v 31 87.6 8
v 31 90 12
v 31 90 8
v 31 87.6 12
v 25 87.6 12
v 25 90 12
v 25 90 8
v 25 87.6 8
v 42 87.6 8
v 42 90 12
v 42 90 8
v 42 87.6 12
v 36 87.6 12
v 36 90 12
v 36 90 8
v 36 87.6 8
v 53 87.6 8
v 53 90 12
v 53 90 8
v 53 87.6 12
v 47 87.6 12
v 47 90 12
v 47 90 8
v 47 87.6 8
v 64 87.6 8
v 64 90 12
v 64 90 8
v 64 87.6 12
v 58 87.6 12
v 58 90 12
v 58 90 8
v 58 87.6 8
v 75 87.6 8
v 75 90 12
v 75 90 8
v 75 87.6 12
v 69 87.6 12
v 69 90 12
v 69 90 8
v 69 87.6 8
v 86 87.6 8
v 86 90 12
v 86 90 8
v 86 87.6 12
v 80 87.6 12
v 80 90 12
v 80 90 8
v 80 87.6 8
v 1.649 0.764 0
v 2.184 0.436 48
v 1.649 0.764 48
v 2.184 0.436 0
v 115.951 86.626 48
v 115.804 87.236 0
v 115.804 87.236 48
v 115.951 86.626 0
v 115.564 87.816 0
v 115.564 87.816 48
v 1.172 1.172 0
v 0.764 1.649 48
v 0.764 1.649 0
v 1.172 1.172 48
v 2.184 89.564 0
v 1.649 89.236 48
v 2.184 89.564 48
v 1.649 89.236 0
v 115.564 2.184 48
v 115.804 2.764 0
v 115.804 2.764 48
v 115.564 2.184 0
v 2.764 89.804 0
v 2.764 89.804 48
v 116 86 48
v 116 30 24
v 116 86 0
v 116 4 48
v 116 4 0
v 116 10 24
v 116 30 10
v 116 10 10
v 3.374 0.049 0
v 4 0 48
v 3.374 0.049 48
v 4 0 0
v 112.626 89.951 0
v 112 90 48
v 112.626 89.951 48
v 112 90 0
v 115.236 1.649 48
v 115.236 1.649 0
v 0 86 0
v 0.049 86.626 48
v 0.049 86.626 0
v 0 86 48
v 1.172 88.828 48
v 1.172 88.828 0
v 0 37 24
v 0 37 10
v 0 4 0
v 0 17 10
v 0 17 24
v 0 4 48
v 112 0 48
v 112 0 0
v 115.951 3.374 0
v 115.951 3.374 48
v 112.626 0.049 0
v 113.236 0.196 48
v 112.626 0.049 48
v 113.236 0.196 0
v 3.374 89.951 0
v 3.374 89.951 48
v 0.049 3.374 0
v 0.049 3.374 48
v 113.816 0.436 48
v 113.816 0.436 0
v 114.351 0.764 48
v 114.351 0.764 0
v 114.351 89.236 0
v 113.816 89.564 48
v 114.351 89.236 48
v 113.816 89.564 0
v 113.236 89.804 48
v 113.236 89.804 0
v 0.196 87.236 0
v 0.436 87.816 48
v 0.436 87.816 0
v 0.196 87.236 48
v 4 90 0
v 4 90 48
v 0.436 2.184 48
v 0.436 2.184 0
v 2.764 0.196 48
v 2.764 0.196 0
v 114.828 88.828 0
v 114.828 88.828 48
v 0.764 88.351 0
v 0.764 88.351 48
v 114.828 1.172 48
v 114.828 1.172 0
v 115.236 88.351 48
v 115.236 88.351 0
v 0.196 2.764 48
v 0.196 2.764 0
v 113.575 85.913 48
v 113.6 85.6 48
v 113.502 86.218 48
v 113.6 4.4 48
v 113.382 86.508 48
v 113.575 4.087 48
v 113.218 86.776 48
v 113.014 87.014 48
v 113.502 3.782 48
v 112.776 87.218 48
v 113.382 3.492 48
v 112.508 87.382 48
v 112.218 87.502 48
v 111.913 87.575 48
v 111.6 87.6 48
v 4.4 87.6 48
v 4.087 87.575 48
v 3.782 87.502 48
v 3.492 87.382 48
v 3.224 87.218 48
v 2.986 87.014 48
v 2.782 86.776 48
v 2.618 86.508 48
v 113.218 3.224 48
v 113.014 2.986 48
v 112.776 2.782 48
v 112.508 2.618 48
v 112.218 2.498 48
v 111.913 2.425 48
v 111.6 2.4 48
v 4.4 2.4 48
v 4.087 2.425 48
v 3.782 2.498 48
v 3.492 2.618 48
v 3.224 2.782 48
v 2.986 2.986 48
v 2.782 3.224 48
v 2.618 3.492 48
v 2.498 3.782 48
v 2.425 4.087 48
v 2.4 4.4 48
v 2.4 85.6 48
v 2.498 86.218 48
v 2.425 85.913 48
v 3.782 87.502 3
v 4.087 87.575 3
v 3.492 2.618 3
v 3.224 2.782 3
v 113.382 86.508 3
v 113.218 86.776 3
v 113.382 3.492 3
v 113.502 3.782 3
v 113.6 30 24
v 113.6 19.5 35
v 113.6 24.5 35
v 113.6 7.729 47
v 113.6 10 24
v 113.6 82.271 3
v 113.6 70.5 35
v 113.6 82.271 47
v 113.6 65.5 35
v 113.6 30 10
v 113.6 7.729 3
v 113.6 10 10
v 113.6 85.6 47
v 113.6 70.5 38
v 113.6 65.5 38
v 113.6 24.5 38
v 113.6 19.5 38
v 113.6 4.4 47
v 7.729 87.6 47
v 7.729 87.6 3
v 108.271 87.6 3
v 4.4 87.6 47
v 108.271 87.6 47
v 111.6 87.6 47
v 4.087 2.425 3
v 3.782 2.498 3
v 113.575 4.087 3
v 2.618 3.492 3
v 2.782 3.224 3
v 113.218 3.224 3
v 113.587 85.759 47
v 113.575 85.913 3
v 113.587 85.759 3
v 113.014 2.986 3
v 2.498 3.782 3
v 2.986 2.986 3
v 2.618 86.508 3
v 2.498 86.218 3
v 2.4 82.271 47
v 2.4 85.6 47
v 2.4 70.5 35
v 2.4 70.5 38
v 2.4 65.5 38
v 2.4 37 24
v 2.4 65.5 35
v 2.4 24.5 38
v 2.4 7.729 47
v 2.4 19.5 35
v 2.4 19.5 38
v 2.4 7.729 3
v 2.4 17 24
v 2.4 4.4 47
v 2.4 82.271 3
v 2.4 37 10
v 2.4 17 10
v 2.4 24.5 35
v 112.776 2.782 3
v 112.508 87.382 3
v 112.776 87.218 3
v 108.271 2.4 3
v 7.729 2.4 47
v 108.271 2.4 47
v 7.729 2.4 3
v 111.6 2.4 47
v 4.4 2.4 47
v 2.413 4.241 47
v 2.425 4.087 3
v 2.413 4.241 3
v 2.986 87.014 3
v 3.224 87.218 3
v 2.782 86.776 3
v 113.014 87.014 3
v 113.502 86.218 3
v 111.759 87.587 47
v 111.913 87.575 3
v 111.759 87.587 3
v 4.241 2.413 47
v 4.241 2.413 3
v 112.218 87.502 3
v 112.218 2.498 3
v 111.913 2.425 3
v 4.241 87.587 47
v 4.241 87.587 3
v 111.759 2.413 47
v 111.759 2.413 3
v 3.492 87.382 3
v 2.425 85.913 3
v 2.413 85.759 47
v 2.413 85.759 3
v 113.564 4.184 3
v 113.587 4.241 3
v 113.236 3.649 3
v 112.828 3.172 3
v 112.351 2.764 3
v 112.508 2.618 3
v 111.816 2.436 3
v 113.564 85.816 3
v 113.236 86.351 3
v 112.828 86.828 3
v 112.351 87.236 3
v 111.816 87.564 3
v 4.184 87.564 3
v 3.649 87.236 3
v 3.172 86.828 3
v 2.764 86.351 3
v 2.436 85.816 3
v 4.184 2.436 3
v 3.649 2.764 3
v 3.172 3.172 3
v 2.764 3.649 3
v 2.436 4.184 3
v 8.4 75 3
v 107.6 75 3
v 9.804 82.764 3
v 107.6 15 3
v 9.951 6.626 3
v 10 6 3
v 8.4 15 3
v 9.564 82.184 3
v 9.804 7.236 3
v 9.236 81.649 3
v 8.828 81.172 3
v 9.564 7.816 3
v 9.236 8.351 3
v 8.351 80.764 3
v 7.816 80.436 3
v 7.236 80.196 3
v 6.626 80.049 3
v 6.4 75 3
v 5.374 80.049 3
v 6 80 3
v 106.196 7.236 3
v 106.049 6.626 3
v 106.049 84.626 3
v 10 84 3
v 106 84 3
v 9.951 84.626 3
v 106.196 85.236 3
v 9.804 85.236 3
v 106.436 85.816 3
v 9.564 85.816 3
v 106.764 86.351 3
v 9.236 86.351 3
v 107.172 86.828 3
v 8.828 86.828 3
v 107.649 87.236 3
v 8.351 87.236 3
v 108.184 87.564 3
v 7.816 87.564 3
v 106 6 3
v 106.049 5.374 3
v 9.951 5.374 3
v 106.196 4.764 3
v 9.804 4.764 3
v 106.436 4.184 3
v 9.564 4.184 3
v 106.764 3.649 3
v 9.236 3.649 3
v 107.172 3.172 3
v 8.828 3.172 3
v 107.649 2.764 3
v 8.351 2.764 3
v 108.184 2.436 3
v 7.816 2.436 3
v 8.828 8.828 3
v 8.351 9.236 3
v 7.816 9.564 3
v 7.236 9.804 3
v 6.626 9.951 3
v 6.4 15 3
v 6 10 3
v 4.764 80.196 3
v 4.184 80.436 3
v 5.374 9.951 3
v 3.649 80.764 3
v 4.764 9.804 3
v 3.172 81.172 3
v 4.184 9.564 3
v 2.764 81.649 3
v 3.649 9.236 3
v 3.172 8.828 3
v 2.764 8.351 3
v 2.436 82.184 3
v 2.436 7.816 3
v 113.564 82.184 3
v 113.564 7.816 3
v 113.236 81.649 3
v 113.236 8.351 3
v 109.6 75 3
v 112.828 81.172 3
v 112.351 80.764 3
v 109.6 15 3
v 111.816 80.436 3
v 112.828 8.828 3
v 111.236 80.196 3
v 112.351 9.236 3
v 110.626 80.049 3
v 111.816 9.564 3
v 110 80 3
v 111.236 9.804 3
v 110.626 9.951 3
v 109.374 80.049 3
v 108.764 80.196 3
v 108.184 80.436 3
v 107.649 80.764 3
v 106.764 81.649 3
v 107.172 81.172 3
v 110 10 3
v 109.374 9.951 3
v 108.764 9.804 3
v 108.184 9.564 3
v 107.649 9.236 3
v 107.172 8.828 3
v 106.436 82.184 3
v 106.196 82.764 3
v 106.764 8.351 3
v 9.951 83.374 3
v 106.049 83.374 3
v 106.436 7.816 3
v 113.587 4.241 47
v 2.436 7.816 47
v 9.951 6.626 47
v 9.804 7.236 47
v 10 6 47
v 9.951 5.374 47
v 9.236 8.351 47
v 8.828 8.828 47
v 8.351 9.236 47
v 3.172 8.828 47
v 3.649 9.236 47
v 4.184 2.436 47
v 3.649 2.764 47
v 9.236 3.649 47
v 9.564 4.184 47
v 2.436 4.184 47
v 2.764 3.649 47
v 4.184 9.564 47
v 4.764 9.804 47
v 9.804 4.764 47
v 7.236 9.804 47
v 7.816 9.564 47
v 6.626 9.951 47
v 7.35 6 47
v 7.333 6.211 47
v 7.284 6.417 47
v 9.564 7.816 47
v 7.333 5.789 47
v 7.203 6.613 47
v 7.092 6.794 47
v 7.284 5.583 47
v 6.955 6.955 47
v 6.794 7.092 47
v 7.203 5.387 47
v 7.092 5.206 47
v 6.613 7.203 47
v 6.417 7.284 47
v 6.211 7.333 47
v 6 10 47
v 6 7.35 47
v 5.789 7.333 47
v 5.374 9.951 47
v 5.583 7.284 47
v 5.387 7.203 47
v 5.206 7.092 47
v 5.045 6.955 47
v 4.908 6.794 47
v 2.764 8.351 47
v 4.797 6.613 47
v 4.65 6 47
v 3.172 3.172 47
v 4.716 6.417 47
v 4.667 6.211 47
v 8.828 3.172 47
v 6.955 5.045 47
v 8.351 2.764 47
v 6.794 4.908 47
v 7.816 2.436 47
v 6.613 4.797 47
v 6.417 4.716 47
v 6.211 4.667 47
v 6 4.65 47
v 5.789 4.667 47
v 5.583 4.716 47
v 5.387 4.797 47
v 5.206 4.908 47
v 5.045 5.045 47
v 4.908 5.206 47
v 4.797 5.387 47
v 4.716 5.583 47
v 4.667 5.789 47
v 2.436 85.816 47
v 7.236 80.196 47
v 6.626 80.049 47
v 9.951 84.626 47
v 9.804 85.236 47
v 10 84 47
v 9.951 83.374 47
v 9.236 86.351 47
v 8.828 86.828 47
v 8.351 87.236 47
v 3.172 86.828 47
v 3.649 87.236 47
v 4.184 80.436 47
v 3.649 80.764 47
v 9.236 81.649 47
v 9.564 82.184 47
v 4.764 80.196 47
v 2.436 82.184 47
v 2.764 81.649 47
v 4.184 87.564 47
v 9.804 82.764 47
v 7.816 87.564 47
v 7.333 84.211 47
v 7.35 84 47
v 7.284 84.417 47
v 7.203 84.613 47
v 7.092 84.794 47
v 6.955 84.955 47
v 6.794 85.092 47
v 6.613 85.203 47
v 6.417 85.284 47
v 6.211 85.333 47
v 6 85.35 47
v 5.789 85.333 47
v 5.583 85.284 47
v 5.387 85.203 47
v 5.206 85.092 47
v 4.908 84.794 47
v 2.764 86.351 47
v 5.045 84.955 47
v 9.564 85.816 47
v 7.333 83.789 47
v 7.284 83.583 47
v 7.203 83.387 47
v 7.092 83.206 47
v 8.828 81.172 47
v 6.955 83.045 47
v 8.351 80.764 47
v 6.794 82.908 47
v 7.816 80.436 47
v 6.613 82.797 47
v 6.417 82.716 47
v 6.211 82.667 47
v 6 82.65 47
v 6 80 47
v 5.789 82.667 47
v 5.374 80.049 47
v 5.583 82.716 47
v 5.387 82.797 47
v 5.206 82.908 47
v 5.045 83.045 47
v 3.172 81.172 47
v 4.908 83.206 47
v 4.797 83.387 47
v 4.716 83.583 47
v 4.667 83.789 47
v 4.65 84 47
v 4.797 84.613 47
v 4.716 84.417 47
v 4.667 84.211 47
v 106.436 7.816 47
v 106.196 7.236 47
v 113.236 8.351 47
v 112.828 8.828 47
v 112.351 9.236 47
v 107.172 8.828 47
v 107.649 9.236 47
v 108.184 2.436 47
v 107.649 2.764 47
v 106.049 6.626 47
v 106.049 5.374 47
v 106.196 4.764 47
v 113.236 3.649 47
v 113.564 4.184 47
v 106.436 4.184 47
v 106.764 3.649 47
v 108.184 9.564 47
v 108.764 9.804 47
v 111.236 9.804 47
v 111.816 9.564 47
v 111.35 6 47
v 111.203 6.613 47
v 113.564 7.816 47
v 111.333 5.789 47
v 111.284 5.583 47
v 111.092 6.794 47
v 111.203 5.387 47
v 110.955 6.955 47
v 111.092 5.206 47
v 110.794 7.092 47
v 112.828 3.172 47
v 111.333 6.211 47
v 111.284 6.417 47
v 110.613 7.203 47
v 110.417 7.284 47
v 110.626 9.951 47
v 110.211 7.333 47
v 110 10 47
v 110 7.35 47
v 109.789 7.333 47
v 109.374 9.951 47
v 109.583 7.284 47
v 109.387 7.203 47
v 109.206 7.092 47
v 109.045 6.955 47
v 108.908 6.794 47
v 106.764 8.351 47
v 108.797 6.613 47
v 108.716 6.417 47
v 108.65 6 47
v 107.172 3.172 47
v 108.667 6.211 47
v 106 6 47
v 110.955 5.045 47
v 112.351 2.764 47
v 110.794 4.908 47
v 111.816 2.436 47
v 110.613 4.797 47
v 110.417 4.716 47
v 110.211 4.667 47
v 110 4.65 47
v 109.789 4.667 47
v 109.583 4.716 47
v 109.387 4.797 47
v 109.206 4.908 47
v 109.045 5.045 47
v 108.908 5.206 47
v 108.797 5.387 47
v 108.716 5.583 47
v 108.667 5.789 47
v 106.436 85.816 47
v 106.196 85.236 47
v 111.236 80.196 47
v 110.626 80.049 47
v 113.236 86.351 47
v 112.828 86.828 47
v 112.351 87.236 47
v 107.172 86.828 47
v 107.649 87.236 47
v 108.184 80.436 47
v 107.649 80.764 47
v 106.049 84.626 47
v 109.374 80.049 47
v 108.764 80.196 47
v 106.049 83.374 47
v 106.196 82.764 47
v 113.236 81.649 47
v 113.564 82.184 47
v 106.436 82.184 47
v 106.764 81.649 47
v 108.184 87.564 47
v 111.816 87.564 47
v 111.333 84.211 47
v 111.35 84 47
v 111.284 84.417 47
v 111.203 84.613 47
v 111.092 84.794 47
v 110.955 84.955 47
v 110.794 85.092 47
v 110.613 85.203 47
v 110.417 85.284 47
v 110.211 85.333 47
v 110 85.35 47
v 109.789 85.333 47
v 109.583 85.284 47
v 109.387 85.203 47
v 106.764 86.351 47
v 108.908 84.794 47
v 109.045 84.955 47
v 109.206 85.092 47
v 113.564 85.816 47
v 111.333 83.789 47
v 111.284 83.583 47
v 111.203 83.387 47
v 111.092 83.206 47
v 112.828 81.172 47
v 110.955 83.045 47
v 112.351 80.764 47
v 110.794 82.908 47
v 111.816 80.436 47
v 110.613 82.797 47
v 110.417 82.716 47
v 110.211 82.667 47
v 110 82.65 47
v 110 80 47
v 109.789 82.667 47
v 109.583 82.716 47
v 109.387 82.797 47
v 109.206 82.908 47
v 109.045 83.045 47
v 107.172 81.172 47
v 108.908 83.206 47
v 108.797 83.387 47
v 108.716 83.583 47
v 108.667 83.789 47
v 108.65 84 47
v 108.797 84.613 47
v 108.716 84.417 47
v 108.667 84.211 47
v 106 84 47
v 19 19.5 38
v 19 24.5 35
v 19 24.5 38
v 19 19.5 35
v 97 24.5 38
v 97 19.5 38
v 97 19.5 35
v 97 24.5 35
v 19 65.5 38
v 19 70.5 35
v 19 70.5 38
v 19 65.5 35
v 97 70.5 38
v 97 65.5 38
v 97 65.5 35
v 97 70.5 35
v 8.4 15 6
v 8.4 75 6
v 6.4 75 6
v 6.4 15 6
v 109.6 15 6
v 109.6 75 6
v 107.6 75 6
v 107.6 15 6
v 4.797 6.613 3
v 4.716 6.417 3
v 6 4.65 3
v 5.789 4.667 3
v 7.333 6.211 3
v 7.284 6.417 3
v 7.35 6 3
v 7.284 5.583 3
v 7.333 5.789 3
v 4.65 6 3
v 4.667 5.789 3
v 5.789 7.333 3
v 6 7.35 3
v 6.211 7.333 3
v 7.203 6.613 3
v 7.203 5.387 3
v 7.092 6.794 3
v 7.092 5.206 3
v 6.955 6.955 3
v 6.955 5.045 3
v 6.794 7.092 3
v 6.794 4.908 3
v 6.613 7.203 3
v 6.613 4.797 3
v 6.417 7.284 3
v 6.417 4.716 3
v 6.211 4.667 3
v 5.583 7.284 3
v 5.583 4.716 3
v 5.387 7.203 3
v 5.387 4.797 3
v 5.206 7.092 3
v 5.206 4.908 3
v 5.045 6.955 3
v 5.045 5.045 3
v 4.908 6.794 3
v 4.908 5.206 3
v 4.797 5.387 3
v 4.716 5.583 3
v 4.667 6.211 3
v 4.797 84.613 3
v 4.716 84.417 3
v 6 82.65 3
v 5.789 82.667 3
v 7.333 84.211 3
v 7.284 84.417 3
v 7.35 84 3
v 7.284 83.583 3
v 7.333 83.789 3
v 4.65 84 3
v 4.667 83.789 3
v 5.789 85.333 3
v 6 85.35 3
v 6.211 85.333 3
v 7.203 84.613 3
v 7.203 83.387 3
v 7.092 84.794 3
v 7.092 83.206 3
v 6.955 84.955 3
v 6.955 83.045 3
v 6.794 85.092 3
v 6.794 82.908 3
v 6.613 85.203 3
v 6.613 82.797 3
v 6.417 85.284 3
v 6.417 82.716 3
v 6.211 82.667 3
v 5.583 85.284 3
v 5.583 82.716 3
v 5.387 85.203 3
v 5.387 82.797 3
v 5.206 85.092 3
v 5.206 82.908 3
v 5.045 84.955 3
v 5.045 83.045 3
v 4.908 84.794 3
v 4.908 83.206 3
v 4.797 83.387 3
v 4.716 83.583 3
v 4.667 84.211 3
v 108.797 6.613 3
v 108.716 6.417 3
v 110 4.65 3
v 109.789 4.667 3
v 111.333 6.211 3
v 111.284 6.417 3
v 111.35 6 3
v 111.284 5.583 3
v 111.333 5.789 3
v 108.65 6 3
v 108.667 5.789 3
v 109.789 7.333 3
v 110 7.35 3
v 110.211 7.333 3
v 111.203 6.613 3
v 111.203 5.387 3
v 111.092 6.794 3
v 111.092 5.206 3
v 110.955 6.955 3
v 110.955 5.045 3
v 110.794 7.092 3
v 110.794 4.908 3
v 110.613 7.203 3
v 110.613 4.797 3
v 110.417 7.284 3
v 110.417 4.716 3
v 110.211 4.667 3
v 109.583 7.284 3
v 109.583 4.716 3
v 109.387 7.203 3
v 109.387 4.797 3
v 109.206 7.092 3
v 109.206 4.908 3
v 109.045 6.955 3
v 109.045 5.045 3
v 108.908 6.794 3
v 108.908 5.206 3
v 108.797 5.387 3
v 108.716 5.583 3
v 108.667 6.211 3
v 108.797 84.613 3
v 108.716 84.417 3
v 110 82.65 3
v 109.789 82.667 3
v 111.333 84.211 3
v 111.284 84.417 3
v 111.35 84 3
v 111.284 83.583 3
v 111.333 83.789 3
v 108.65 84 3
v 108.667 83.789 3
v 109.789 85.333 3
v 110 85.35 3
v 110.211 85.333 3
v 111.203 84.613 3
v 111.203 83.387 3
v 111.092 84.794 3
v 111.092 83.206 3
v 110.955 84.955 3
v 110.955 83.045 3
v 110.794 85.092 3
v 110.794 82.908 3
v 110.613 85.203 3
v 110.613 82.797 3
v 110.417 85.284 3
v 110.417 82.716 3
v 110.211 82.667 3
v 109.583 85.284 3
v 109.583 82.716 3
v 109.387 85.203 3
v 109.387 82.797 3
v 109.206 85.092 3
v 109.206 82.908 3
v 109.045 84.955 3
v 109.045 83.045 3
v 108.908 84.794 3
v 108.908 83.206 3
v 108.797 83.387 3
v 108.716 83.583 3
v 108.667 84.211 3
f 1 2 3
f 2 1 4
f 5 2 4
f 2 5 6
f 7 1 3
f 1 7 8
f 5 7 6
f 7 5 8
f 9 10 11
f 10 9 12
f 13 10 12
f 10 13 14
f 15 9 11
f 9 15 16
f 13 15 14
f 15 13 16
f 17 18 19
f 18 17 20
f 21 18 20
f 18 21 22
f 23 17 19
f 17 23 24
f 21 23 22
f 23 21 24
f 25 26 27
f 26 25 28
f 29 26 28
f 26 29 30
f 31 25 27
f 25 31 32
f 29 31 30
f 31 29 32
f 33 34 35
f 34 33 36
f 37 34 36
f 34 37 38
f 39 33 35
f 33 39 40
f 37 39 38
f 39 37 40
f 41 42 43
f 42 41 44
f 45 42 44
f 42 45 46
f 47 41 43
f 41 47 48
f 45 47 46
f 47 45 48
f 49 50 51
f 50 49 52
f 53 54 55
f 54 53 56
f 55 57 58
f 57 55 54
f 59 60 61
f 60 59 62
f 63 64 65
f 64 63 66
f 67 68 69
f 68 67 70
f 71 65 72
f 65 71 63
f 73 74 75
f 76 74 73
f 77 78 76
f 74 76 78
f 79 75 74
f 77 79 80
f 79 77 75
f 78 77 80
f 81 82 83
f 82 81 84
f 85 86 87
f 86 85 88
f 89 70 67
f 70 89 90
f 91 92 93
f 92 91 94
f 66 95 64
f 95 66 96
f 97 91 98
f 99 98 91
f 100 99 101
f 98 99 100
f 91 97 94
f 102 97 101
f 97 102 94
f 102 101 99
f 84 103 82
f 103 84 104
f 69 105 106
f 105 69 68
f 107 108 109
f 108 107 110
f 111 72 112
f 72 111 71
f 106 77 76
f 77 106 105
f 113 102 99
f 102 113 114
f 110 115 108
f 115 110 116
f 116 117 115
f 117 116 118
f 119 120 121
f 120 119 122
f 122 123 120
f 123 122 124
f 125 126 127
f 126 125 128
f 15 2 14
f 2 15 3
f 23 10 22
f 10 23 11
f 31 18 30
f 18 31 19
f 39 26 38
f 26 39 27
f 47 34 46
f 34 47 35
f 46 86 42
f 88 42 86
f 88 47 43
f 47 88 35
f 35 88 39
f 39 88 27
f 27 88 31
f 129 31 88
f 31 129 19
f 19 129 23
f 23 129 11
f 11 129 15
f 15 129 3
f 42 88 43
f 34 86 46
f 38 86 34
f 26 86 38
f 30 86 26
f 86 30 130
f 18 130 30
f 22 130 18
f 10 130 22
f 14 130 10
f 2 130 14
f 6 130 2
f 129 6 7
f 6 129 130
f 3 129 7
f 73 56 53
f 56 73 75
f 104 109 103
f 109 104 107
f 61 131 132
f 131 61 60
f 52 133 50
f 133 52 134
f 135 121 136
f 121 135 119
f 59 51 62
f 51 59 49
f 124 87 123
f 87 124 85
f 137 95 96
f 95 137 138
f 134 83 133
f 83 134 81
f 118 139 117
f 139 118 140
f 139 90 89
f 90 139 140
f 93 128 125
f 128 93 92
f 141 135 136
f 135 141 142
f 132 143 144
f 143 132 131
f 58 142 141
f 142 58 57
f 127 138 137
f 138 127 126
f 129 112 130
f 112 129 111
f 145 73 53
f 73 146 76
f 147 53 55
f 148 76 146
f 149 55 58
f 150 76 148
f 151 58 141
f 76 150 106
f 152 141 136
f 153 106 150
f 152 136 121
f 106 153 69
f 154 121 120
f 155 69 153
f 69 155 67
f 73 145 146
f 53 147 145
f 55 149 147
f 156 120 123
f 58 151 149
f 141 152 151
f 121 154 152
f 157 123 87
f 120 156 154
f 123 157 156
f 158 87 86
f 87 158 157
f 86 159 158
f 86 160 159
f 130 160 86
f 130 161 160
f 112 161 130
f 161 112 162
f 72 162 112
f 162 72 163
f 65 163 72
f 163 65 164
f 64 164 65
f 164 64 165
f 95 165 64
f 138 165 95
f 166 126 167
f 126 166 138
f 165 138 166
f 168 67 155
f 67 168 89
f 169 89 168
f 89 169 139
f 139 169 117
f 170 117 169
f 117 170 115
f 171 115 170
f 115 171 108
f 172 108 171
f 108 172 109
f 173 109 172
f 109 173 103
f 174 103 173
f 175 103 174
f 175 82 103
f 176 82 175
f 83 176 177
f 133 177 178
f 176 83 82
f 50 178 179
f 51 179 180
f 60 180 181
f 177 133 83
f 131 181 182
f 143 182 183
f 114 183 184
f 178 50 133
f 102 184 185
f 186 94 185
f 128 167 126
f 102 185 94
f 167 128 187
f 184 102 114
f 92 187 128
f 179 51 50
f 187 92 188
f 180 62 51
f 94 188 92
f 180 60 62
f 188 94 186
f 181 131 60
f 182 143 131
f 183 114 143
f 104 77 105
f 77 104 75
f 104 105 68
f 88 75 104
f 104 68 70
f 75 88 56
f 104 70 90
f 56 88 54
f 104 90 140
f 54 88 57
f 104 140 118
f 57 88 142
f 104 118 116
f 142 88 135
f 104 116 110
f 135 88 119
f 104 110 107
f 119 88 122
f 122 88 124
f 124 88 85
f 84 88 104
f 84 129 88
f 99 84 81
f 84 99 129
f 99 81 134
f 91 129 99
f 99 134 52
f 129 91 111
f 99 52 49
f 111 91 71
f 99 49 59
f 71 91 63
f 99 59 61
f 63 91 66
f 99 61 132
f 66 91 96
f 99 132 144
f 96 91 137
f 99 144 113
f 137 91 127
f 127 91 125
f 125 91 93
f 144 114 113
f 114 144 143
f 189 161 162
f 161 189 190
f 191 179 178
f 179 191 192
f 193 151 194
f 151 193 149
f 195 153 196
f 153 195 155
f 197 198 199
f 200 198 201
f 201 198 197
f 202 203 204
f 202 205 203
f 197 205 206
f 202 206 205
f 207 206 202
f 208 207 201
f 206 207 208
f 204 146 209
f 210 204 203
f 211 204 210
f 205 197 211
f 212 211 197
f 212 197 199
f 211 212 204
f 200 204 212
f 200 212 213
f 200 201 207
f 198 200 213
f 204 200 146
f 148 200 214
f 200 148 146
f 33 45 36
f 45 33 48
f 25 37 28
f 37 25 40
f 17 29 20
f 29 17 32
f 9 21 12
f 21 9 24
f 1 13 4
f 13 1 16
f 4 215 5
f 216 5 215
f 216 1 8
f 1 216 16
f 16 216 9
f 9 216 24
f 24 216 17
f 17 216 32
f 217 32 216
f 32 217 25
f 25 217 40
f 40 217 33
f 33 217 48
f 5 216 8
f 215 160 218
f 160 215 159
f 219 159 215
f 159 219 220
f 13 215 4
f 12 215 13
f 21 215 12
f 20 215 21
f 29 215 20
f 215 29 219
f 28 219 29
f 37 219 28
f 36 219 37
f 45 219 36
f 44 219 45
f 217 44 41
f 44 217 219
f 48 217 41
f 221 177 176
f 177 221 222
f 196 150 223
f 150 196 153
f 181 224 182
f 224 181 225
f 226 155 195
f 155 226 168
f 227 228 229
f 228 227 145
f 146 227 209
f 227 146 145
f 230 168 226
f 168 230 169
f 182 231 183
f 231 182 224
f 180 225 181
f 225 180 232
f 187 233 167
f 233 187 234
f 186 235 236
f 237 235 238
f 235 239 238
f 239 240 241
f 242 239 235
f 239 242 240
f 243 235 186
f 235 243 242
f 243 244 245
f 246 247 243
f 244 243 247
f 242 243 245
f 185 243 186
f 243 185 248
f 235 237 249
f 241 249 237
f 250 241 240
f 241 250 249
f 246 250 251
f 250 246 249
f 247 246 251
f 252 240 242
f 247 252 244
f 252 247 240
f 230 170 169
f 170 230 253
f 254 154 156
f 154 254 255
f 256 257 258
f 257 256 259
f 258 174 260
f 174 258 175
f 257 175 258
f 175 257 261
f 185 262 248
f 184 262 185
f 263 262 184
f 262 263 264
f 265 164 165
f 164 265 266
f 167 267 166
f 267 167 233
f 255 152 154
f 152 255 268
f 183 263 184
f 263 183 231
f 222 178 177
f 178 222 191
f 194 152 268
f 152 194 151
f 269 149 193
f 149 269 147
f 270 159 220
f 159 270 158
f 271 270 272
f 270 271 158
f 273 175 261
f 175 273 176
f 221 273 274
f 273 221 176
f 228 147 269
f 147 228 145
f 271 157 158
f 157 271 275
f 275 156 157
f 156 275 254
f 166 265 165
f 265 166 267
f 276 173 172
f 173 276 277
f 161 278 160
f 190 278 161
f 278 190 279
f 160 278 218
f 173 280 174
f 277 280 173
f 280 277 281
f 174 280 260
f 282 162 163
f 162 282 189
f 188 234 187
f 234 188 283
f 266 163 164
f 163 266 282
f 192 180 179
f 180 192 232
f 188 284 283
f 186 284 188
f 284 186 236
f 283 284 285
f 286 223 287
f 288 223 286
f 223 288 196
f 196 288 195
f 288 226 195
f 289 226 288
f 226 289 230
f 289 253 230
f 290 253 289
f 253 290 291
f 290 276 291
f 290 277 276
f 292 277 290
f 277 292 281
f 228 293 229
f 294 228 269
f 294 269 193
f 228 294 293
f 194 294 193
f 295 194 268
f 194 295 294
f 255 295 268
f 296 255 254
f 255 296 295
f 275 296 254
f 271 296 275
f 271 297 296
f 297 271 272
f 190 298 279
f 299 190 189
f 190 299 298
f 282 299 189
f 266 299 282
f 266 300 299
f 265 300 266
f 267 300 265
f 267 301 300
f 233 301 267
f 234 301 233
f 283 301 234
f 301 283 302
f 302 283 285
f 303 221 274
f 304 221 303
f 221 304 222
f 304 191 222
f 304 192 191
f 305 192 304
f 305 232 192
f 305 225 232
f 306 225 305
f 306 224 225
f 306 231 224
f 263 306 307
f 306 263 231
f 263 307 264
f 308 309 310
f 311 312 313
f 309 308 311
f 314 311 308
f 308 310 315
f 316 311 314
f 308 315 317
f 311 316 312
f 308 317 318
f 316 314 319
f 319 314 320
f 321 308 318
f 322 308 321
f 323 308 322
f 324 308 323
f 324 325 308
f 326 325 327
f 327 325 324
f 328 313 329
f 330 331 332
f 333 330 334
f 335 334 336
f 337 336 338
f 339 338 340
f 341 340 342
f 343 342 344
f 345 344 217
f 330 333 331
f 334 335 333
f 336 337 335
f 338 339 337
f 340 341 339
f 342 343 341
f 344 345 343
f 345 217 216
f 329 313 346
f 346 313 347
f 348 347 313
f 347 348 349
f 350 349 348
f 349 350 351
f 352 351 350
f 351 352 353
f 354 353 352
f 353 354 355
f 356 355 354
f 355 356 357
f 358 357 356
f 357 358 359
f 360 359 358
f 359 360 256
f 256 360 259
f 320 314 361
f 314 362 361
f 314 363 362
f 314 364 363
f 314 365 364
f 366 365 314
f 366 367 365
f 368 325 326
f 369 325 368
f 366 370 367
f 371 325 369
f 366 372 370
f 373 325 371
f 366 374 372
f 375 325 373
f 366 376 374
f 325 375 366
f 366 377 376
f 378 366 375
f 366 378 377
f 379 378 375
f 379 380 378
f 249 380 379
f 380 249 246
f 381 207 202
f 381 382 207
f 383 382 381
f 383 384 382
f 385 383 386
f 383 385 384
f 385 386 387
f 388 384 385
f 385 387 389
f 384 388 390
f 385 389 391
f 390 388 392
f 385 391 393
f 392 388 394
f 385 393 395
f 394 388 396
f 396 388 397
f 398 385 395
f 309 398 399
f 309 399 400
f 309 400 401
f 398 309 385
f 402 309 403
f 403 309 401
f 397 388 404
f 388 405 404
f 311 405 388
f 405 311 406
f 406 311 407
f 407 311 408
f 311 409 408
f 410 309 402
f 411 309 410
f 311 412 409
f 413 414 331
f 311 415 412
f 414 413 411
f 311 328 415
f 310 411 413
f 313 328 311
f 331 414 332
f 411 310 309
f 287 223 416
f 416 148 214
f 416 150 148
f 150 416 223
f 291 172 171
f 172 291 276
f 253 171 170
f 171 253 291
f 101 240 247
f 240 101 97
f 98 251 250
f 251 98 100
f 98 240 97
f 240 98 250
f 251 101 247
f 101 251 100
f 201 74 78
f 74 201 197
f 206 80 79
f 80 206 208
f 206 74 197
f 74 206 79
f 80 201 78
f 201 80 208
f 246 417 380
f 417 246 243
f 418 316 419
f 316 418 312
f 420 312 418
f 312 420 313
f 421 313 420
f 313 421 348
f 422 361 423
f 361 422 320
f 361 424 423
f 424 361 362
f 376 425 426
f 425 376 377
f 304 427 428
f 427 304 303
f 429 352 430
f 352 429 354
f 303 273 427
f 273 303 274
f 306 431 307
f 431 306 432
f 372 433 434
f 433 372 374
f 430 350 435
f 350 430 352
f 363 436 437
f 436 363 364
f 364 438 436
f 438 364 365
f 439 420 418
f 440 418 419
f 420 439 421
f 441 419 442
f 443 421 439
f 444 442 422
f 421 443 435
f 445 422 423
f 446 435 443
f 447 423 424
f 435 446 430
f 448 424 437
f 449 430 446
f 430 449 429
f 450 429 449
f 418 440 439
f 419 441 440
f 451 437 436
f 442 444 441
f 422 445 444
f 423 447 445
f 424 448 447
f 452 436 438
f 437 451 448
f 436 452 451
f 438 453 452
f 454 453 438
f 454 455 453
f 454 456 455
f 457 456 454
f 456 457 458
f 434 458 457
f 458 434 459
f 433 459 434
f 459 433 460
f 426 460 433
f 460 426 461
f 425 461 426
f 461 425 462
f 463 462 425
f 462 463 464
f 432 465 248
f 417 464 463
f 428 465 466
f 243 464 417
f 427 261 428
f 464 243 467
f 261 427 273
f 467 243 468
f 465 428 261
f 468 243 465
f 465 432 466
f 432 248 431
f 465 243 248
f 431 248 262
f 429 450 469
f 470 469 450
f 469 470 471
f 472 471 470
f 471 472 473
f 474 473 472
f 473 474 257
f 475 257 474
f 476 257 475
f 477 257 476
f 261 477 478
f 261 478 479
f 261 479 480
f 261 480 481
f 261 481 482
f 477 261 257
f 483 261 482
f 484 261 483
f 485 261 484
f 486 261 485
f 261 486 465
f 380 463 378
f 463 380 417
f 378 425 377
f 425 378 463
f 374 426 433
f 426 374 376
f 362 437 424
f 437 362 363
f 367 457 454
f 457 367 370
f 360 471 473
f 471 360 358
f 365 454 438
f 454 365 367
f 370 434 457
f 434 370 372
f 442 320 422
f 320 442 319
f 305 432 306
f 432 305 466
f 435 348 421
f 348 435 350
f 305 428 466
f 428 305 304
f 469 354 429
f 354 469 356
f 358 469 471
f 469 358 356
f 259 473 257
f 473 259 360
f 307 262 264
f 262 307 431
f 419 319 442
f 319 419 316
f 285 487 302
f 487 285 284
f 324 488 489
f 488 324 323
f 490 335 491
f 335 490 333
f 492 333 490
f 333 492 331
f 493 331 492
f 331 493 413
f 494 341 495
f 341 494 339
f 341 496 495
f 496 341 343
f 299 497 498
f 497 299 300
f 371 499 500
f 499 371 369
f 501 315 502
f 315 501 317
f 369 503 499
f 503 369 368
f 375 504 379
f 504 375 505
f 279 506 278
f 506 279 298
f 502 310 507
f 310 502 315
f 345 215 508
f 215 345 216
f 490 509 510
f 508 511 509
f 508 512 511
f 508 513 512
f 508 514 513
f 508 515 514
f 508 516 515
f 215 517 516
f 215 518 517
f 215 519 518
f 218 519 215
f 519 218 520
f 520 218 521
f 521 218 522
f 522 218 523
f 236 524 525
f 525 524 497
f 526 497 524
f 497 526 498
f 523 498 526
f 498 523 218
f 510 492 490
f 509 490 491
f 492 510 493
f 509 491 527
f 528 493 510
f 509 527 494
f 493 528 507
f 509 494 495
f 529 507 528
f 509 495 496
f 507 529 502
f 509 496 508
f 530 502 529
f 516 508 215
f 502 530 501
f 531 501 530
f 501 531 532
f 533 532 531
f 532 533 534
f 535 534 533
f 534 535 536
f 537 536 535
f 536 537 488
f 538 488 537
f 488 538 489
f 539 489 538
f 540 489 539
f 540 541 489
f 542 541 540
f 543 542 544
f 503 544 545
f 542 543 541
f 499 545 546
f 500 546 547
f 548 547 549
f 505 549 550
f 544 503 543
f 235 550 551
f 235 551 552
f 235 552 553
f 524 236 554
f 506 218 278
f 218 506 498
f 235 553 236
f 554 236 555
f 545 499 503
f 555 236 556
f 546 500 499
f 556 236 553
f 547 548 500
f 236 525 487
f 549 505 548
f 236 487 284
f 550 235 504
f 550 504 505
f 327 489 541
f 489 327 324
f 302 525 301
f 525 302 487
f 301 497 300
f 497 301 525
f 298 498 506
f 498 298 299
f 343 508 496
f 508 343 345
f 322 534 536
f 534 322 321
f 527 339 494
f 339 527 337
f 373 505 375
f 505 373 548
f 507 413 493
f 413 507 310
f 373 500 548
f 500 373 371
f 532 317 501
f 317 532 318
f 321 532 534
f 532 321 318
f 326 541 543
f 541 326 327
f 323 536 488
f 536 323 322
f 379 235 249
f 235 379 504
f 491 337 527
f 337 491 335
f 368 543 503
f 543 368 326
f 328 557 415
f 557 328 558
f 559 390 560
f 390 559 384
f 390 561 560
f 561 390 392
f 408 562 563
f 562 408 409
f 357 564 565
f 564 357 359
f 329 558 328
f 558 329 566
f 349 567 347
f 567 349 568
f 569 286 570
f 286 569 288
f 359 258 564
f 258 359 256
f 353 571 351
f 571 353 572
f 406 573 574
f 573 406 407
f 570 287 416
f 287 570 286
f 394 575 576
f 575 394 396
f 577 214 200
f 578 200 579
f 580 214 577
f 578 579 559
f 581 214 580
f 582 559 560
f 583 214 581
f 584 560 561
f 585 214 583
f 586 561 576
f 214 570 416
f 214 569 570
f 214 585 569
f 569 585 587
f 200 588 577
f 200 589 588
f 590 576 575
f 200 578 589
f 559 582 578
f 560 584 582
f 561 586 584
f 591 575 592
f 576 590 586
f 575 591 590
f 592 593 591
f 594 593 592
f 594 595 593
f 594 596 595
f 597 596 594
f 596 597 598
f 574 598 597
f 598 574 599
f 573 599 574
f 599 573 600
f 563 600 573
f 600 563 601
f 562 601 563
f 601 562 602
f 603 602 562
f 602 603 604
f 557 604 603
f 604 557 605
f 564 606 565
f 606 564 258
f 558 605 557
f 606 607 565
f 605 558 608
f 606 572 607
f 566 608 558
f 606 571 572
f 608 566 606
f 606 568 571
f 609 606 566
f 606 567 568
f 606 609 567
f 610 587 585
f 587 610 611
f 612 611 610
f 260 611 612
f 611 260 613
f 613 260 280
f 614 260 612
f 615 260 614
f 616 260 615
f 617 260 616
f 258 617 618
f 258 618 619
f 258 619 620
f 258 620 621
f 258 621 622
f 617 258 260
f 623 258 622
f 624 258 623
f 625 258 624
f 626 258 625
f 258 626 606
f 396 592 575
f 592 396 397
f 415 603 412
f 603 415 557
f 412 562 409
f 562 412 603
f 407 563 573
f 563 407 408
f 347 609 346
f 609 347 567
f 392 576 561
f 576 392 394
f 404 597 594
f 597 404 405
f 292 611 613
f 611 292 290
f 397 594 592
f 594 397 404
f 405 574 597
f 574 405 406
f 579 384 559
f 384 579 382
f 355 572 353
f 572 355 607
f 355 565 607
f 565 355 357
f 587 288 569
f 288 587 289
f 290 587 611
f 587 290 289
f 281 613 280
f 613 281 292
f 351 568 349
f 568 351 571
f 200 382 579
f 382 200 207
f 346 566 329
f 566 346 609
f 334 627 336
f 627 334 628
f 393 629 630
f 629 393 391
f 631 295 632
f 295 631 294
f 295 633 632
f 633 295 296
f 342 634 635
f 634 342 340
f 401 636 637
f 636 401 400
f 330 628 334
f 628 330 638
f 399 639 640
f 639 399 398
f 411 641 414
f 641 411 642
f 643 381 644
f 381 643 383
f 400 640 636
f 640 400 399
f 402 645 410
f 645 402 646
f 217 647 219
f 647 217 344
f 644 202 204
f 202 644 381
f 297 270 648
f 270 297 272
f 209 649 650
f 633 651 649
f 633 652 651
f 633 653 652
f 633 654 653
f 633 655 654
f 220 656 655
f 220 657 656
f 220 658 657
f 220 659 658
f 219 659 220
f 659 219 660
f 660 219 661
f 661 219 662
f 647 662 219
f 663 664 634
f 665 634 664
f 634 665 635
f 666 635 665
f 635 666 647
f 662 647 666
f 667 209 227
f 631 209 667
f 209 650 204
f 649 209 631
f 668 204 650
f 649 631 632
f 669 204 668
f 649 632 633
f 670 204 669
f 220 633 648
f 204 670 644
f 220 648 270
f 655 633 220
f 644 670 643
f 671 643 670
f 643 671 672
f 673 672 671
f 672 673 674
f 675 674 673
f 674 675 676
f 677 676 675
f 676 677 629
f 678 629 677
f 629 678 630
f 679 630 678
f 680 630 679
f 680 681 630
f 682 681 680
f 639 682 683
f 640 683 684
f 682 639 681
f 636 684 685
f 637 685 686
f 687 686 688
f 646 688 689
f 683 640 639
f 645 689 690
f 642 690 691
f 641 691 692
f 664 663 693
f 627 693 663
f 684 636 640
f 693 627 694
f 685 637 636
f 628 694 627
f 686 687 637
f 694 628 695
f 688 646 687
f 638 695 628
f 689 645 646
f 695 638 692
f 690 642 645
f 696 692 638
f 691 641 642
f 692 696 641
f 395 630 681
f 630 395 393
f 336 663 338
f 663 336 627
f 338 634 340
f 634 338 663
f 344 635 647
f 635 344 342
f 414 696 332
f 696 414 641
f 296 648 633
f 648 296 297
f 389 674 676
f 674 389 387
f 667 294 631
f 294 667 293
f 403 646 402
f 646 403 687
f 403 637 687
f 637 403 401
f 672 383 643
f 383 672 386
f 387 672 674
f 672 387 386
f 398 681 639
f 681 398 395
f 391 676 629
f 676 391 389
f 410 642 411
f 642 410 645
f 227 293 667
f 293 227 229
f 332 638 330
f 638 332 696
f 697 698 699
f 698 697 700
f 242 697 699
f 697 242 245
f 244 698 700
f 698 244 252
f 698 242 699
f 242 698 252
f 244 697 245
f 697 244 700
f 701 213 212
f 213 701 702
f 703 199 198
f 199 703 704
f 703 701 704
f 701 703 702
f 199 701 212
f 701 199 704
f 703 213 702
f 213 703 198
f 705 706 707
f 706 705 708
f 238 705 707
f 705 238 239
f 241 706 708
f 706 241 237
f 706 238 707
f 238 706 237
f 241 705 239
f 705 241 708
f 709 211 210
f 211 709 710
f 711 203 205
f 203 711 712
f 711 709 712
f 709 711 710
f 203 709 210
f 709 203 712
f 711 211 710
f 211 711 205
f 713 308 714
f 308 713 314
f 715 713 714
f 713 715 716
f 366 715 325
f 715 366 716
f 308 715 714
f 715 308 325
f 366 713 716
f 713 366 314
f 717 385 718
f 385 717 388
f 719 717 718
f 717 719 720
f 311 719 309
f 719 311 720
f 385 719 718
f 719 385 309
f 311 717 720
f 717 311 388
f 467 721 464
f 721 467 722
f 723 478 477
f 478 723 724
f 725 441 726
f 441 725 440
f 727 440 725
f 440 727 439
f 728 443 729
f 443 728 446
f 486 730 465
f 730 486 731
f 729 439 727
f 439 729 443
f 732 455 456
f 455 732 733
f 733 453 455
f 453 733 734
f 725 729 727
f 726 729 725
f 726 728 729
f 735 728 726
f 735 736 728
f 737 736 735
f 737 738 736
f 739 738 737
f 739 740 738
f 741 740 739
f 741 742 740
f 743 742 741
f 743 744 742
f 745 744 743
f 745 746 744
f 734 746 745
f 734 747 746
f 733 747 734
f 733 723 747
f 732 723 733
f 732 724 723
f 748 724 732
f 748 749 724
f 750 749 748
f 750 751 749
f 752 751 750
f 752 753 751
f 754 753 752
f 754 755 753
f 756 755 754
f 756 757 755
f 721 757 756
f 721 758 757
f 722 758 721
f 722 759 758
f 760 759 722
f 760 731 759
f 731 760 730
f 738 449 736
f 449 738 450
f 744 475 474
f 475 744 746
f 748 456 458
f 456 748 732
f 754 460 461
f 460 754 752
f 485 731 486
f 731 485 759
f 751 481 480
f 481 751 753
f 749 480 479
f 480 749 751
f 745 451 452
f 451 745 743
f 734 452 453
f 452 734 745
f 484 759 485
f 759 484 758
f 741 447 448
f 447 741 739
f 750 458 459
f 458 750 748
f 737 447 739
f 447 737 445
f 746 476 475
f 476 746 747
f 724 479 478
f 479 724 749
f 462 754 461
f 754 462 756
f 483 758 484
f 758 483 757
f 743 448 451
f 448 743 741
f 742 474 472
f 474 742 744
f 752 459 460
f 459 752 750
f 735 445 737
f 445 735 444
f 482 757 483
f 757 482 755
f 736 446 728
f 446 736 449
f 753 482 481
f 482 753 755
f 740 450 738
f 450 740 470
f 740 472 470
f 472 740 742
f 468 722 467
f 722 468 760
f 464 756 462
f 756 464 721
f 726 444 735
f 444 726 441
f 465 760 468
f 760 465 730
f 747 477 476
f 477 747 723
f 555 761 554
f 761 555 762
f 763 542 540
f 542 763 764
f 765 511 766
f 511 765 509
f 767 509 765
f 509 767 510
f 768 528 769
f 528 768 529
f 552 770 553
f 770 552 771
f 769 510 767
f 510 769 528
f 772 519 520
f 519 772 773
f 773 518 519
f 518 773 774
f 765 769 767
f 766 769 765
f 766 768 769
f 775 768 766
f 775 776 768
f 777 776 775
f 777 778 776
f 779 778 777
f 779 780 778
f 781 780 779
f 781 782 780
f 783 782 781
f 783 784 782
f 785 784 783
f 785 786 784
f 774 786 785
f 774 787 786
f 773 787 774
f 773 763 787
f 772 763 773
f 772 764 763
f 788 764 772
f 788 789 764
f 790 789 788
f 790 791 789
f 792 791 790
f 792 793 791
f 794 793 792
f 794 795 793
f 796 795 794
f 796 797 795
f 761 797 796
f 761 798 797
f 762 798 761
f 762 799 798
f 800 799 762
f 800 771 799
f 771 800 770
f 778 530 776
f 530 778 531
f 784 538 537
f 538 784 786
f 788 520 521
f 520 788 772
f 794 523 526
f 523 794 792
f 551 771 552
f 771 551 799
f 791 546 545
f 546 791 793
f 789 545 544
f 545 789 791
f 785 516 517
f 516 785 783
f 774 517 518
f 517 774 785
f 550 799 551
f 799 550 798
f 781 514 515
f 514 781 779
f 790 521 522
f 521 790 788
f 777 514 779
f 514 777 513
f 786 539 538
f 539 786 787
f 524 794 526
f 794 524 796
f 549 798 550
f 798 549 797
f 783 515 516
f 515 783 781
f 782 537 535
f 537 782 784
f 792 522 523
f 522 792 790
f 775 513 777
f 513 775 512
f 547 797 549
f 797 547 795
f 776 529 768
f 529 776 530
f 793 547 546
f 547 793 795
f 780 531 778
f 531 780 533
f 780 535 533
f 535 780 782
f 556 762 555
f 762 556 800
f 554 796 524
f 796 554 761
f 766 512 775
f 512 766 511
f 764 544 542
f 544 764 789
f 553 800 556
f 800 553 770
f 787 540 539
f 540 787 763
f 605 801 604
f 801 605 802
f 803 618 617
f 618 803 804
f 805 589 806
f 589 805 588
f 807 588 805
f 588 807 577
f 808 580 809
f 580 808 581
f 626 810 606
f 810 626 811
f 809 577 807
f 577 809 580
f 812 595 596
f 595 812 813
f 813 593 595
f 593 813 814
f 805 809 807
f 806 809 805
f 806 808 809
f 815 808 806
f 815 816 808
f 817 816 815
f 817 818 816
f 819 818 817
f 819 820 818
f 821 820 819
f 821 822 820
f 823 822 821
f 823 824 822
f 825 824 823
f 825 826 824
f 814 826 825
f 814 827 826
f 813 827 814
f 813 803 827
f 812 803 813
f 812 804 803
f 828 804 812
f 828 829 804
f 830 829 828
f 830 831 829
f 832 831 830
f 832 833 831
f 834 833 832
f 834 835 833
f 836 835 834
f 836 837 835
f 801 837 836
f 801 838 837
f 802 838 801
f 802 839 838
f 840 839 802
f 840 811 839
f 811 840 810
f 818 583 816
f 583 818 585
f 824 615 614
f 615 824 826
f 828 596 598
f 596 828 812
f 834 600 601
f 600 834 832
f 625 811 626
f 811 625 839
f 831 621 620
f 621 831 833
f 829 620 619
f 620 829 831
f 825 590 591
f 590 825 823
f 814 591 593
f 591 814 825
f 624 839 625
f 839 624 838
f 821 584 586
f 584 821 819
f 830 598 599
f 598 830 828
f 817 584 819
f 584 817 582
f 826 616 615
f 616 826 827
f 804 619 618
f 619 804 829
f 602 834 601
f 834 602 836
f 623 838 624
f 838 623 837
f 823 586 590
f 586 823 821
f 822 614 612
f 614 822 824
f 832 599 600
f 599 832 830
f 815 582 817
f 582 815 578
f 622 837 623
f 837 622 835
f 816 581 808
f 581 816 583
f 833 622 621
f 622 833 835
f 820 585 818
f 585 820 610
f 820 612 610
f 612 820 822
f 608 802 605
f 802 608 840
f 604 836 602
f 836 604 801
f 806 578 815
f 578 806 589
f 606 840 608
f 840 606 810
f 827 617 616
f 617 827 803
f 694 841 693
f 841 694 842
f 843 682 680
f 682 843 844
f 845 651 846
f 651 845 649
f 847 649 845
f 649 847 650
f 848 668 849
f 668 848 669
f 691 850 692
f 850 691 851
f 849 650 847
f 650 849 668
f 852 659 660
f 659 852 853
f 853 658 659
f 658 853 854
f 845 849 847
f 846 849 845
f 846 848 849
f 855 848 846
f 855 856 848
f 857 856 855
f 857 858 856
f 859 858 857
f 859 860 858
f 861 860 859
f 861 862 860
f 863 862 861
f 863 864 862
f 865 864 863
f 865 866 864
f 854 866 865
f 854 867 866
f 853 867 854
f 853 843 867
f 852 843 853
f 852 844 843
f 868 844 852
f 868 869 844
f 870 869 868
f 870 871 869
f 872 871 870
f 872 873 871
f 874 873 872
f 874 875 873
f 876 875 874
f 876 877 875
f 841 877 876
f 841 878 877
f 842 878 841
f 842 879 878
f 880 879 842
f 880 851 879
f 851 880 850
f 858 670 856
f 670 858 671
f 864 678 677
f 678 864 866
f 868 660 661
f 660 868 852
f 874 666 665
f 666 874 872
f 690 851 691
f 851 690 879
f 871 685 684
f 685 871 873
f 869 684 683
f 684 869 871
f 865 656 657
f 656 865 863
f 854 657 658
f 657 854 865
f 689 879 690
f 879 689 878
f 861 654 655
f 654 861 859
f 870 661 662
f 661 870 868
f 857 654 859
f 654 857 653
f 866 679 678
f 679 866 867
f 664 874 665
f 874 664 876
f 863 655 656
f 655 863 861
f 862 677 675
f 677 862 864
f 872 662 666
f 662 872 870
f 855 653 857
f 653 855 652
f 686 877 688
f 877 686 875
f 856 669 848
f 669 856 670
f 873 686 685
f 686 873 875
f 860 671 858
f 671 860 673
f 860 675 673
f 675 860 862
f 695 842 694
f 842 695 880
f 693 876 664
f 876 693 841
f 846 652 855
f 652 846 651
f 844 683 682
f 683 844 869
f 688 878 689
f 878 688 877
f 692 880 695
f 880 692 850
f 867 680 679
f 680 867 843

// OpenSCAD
// Original Bricohams prototype, millimetres. Measure your board before printing.
product = "clock"; // "clock" or "tutor"
part = "base"; // base, lid, paddle_left, paddle_right, clamp, fit_coupon
$fn = 40;
wall = 2.4;
floor_thickness = 3;
clearance = 0.6;
pcb_w = 86;
pcb_h = 50;
screen_w = 70;
screen_h = 43;
screen_stack = 9;
bank_w = 100;
bank_h = 60;
bank_t = 22;
is_tutor = product == "tutor";
case_w = is_tutor ? 174 : 116;
case_h = is_tutor ? 132 : 90;
case_z = is_tutor ? 60 : 48;
rear_start = is_tutor ? 56 : 0;
board_x = case_w / 2;
board_y = is_tutor ? 94 : case_h / 2;
board_z = case_z - screen_stack - 1;
lid_t = 2.4;
lip = 1.5;

assert(pcb_w + 2 * clearance < case_w - 2 * wall - 12);
assert(pcb_h + 2 * clearance < case_h - rear_start - 2 * wall - 8);
assert(bank_w + 2 * clearance < case_w - 2 * wall);
assert(bank_h + 2 * clearance < case_h - rear_start - 2 * wall);
assert(bank_t + floor_thickness + 5 < board_z);
assert(screen_w < pcb_w && screen_h < pcb_h);

module round_box(w, h, z, r=4) {
    hull() for (x=[r,w-r], y=[r,h-r])
        translate([x,y,0]) cylinder(r=r,h=z);
}

module screw_positions() {
    for (x=[6,case_w-6], y=[rear_start+6,case_h-6])
        translate([x,y,0]) children();
}

module board_corners() {
    for (sx=[-1,1], sy=[-1,1])
        translate([board_x+sx*(pcb_w/2-2),
                   board_y+sy*(pcb_h/2-2),0]) children();
}

module rear_shell() {
    difference() {
        translate([0,rear_start,0])
            round_box(case_w,case_h-rear_start,case_z);
        translate([wall,rear_start+wall,floor_thickness])
            round_box(case_w-2*wall,case_h-rear_start-2*wall,case_z,2);
        // Oversized cable apertures: final connector positions are board-specific.
        translate([-1,rear_start+17,10]) cube([wall+2,20,14]);
        translate([case_w-wall-1,rear_start+10,10]) cube([wall+2,20,14]);
        if (is_tutor) for (y=[rear_start+35,rear_start+50])
            translate([case_w-wall-1,y,43])
                rotate([0,90,0]) cylinder(d=6.5,h=wall+2);
        for (i=[0:5])
            translate([25+i*11,case_h-wall-1,8]) cube([6,wall+2,4]);
    }
}

module base() {
    difference() {
        union() {
            rear_shell();
            screw_positions() cylinder(d=8,h=case_z-1);
            // These ledges support PCB corners; no undocumented PCB hole pattern.
            for (sy=[-1,1], sx=[-1,1]) {
                edge_x = sx < 0 ? wall-0.1 : board_x+pcb_w/2-4;
                beam_w = sx < 0 ? board_x-pcb_w/2+4-wall+0.1
                               : case_w-wall-edge_x+0.1;
                translate([edge_x,board_y+sy*(pcb_h/2-2)-2.5,board_z-3])
                    cube([beam_w,5,3]);
            }
            // Retaining rails keep an enclosed USB power bank off the side walls.
            for (s=[-1,1])
                translate([board_x+s*(bank_w/2+clearance)-1,
                           board_y-bank_h/2, floor_thickness])
                    cube([2,bank_h,3]);
            if (is_tutor) {
                round_box(case_w,rear_start+wall,floor_thickness);
                for (x=[60,114])
                    translate([x,43,floor_thickness]) cylinder(d=10,h=5);
                for (x=[74,100])
                    translate([x-3,23-3,floor_thickness]) cube([6,6,14]);
                for (x=[48,126])
                    translate([x,10,floor_thickness]) cylinder(d=5,h=12);
                // Adapter tray pillars, 80 x 40 mm PCB with 3.2 mm corner holes.
                for (y=[77,111])
                    translate([wall-0.1,y-3.5,29]) cube([case_w-2*wall+0.2,7,3]);
                for (x=[50,124], y=[77,111])
                    translate([x,y,29]) cylinder(d=7,h=3);
            }
        }
        screw_positions() translate([0,0,floor_thickness]) cylinder(d=2.7,h=case_z);
        if (is_tutor) {
            for (x=[60,114])
                translate([x,43,-1]) cylinder(d=3.3,h=12);
            for (x=[74,100])
                translate([x-5,23,12]) rotate([0,90,0]) cylinder(d=2.8,h=10);
            for (x=[50,124], y=[77,111])
                translate([x,y,28]) cylinder(d=2.7,h=5);
            for (x=[60,114])
                translate([x,43,-0.01]) cylinder(d=6.4,h=2.5,$fn=6);
            for (x=[60,114])
                translate([x,15,-1]) cylinder(d=3,h=floor_thickness+2);
        }
    }
}

module logo(height=0.6) {
    // Text wordmark, not an imitation of the Morserino logo.
    linear_extrude(height=height)
        text("BRICOHAMS",size=5,font="Liberation Sans:style=Bold",
             halign="center",valign="center");
}

module lid() {
    difference() {
        union() {
            translate([0,rear_start,0]) round_box(case_w,case_h-rear_start,lid_t);
            translate([wall+clearance,rear_start+wall+clearance,lid_t-0.2])
                difference() {
                    round_box(case_w-2*(wall+clearance),
                              case_h-rear_start-2*(wall+clearance),lip+0.2,2);
                    translate([1.5,1.5,-1])
                        round_box(case_w-2*(wall+clearance)-3,
                                  case_h-rear_start-2*(wall+clearance)-3,lip+2,1);
                }
        }
        translate([board_x-screen_w/2,board_y-screen_h/2,-1])
            cube([screen_w,screen_h,lid_t+lip+2]);
        screw_positions() translate([0,0,-1]) cylinder(d=3.4,h=lid_t+lip+2);
        // Face down on the print bed: engraved brand remains printable without support.
        translate([case_w/2,rear_start+10,-0.01]) mirror([1,0,0]) logo(0.7);
    }
}

module paddle(left=true) {
    // Print flat. M3 vertical pivot and horizontal M3 contact screw.
    difference() {
        union() {
            translate([-4,-38,0]) cube([8,38,12]);
            cylinder(d=14,h=12);
            translate([-7,-40,0]) round_box(14,12,16,2);
        }
        translate([0,0,-1]) cylinder(d=3.3,h=15);
        translate([-9,-20,4]) rotate([0,90,0]) cylinder(d=3.3,h=18);
        translate([0,-31,-1]) cylinder(d=2.8,h=19);
        translate([0,-5,11.4])
            linear_extrude(height=1)
                text(left ? "." : "-",size=6,halign="center");
    }
}

module clamp() {
    difference() {
        cube([12,6,3]);
        translate([3,3,-1]) cylinder(d=3.2,h=5);
    }
}

module fit_coupon() {
    difference() {
        round_box(40,25,3,2);
        for (i=[0:3])
            translate([7+i*8,8,-1]) cylinder(d=3+i*0.1,h=5);
        translate([4,16,-1]) cube([20,6.5,5]);
    }
}

if (part == "base") base();
else if (part == "lid") lid();
else if (part == "paddle_left") paddle(true);
else if (part == "paddle_right") paddle(false);
else if (part == "clamp") clamp();
else if (part == "fit_coupon") fit_coupon();
else assert(false,"Unknown part");
